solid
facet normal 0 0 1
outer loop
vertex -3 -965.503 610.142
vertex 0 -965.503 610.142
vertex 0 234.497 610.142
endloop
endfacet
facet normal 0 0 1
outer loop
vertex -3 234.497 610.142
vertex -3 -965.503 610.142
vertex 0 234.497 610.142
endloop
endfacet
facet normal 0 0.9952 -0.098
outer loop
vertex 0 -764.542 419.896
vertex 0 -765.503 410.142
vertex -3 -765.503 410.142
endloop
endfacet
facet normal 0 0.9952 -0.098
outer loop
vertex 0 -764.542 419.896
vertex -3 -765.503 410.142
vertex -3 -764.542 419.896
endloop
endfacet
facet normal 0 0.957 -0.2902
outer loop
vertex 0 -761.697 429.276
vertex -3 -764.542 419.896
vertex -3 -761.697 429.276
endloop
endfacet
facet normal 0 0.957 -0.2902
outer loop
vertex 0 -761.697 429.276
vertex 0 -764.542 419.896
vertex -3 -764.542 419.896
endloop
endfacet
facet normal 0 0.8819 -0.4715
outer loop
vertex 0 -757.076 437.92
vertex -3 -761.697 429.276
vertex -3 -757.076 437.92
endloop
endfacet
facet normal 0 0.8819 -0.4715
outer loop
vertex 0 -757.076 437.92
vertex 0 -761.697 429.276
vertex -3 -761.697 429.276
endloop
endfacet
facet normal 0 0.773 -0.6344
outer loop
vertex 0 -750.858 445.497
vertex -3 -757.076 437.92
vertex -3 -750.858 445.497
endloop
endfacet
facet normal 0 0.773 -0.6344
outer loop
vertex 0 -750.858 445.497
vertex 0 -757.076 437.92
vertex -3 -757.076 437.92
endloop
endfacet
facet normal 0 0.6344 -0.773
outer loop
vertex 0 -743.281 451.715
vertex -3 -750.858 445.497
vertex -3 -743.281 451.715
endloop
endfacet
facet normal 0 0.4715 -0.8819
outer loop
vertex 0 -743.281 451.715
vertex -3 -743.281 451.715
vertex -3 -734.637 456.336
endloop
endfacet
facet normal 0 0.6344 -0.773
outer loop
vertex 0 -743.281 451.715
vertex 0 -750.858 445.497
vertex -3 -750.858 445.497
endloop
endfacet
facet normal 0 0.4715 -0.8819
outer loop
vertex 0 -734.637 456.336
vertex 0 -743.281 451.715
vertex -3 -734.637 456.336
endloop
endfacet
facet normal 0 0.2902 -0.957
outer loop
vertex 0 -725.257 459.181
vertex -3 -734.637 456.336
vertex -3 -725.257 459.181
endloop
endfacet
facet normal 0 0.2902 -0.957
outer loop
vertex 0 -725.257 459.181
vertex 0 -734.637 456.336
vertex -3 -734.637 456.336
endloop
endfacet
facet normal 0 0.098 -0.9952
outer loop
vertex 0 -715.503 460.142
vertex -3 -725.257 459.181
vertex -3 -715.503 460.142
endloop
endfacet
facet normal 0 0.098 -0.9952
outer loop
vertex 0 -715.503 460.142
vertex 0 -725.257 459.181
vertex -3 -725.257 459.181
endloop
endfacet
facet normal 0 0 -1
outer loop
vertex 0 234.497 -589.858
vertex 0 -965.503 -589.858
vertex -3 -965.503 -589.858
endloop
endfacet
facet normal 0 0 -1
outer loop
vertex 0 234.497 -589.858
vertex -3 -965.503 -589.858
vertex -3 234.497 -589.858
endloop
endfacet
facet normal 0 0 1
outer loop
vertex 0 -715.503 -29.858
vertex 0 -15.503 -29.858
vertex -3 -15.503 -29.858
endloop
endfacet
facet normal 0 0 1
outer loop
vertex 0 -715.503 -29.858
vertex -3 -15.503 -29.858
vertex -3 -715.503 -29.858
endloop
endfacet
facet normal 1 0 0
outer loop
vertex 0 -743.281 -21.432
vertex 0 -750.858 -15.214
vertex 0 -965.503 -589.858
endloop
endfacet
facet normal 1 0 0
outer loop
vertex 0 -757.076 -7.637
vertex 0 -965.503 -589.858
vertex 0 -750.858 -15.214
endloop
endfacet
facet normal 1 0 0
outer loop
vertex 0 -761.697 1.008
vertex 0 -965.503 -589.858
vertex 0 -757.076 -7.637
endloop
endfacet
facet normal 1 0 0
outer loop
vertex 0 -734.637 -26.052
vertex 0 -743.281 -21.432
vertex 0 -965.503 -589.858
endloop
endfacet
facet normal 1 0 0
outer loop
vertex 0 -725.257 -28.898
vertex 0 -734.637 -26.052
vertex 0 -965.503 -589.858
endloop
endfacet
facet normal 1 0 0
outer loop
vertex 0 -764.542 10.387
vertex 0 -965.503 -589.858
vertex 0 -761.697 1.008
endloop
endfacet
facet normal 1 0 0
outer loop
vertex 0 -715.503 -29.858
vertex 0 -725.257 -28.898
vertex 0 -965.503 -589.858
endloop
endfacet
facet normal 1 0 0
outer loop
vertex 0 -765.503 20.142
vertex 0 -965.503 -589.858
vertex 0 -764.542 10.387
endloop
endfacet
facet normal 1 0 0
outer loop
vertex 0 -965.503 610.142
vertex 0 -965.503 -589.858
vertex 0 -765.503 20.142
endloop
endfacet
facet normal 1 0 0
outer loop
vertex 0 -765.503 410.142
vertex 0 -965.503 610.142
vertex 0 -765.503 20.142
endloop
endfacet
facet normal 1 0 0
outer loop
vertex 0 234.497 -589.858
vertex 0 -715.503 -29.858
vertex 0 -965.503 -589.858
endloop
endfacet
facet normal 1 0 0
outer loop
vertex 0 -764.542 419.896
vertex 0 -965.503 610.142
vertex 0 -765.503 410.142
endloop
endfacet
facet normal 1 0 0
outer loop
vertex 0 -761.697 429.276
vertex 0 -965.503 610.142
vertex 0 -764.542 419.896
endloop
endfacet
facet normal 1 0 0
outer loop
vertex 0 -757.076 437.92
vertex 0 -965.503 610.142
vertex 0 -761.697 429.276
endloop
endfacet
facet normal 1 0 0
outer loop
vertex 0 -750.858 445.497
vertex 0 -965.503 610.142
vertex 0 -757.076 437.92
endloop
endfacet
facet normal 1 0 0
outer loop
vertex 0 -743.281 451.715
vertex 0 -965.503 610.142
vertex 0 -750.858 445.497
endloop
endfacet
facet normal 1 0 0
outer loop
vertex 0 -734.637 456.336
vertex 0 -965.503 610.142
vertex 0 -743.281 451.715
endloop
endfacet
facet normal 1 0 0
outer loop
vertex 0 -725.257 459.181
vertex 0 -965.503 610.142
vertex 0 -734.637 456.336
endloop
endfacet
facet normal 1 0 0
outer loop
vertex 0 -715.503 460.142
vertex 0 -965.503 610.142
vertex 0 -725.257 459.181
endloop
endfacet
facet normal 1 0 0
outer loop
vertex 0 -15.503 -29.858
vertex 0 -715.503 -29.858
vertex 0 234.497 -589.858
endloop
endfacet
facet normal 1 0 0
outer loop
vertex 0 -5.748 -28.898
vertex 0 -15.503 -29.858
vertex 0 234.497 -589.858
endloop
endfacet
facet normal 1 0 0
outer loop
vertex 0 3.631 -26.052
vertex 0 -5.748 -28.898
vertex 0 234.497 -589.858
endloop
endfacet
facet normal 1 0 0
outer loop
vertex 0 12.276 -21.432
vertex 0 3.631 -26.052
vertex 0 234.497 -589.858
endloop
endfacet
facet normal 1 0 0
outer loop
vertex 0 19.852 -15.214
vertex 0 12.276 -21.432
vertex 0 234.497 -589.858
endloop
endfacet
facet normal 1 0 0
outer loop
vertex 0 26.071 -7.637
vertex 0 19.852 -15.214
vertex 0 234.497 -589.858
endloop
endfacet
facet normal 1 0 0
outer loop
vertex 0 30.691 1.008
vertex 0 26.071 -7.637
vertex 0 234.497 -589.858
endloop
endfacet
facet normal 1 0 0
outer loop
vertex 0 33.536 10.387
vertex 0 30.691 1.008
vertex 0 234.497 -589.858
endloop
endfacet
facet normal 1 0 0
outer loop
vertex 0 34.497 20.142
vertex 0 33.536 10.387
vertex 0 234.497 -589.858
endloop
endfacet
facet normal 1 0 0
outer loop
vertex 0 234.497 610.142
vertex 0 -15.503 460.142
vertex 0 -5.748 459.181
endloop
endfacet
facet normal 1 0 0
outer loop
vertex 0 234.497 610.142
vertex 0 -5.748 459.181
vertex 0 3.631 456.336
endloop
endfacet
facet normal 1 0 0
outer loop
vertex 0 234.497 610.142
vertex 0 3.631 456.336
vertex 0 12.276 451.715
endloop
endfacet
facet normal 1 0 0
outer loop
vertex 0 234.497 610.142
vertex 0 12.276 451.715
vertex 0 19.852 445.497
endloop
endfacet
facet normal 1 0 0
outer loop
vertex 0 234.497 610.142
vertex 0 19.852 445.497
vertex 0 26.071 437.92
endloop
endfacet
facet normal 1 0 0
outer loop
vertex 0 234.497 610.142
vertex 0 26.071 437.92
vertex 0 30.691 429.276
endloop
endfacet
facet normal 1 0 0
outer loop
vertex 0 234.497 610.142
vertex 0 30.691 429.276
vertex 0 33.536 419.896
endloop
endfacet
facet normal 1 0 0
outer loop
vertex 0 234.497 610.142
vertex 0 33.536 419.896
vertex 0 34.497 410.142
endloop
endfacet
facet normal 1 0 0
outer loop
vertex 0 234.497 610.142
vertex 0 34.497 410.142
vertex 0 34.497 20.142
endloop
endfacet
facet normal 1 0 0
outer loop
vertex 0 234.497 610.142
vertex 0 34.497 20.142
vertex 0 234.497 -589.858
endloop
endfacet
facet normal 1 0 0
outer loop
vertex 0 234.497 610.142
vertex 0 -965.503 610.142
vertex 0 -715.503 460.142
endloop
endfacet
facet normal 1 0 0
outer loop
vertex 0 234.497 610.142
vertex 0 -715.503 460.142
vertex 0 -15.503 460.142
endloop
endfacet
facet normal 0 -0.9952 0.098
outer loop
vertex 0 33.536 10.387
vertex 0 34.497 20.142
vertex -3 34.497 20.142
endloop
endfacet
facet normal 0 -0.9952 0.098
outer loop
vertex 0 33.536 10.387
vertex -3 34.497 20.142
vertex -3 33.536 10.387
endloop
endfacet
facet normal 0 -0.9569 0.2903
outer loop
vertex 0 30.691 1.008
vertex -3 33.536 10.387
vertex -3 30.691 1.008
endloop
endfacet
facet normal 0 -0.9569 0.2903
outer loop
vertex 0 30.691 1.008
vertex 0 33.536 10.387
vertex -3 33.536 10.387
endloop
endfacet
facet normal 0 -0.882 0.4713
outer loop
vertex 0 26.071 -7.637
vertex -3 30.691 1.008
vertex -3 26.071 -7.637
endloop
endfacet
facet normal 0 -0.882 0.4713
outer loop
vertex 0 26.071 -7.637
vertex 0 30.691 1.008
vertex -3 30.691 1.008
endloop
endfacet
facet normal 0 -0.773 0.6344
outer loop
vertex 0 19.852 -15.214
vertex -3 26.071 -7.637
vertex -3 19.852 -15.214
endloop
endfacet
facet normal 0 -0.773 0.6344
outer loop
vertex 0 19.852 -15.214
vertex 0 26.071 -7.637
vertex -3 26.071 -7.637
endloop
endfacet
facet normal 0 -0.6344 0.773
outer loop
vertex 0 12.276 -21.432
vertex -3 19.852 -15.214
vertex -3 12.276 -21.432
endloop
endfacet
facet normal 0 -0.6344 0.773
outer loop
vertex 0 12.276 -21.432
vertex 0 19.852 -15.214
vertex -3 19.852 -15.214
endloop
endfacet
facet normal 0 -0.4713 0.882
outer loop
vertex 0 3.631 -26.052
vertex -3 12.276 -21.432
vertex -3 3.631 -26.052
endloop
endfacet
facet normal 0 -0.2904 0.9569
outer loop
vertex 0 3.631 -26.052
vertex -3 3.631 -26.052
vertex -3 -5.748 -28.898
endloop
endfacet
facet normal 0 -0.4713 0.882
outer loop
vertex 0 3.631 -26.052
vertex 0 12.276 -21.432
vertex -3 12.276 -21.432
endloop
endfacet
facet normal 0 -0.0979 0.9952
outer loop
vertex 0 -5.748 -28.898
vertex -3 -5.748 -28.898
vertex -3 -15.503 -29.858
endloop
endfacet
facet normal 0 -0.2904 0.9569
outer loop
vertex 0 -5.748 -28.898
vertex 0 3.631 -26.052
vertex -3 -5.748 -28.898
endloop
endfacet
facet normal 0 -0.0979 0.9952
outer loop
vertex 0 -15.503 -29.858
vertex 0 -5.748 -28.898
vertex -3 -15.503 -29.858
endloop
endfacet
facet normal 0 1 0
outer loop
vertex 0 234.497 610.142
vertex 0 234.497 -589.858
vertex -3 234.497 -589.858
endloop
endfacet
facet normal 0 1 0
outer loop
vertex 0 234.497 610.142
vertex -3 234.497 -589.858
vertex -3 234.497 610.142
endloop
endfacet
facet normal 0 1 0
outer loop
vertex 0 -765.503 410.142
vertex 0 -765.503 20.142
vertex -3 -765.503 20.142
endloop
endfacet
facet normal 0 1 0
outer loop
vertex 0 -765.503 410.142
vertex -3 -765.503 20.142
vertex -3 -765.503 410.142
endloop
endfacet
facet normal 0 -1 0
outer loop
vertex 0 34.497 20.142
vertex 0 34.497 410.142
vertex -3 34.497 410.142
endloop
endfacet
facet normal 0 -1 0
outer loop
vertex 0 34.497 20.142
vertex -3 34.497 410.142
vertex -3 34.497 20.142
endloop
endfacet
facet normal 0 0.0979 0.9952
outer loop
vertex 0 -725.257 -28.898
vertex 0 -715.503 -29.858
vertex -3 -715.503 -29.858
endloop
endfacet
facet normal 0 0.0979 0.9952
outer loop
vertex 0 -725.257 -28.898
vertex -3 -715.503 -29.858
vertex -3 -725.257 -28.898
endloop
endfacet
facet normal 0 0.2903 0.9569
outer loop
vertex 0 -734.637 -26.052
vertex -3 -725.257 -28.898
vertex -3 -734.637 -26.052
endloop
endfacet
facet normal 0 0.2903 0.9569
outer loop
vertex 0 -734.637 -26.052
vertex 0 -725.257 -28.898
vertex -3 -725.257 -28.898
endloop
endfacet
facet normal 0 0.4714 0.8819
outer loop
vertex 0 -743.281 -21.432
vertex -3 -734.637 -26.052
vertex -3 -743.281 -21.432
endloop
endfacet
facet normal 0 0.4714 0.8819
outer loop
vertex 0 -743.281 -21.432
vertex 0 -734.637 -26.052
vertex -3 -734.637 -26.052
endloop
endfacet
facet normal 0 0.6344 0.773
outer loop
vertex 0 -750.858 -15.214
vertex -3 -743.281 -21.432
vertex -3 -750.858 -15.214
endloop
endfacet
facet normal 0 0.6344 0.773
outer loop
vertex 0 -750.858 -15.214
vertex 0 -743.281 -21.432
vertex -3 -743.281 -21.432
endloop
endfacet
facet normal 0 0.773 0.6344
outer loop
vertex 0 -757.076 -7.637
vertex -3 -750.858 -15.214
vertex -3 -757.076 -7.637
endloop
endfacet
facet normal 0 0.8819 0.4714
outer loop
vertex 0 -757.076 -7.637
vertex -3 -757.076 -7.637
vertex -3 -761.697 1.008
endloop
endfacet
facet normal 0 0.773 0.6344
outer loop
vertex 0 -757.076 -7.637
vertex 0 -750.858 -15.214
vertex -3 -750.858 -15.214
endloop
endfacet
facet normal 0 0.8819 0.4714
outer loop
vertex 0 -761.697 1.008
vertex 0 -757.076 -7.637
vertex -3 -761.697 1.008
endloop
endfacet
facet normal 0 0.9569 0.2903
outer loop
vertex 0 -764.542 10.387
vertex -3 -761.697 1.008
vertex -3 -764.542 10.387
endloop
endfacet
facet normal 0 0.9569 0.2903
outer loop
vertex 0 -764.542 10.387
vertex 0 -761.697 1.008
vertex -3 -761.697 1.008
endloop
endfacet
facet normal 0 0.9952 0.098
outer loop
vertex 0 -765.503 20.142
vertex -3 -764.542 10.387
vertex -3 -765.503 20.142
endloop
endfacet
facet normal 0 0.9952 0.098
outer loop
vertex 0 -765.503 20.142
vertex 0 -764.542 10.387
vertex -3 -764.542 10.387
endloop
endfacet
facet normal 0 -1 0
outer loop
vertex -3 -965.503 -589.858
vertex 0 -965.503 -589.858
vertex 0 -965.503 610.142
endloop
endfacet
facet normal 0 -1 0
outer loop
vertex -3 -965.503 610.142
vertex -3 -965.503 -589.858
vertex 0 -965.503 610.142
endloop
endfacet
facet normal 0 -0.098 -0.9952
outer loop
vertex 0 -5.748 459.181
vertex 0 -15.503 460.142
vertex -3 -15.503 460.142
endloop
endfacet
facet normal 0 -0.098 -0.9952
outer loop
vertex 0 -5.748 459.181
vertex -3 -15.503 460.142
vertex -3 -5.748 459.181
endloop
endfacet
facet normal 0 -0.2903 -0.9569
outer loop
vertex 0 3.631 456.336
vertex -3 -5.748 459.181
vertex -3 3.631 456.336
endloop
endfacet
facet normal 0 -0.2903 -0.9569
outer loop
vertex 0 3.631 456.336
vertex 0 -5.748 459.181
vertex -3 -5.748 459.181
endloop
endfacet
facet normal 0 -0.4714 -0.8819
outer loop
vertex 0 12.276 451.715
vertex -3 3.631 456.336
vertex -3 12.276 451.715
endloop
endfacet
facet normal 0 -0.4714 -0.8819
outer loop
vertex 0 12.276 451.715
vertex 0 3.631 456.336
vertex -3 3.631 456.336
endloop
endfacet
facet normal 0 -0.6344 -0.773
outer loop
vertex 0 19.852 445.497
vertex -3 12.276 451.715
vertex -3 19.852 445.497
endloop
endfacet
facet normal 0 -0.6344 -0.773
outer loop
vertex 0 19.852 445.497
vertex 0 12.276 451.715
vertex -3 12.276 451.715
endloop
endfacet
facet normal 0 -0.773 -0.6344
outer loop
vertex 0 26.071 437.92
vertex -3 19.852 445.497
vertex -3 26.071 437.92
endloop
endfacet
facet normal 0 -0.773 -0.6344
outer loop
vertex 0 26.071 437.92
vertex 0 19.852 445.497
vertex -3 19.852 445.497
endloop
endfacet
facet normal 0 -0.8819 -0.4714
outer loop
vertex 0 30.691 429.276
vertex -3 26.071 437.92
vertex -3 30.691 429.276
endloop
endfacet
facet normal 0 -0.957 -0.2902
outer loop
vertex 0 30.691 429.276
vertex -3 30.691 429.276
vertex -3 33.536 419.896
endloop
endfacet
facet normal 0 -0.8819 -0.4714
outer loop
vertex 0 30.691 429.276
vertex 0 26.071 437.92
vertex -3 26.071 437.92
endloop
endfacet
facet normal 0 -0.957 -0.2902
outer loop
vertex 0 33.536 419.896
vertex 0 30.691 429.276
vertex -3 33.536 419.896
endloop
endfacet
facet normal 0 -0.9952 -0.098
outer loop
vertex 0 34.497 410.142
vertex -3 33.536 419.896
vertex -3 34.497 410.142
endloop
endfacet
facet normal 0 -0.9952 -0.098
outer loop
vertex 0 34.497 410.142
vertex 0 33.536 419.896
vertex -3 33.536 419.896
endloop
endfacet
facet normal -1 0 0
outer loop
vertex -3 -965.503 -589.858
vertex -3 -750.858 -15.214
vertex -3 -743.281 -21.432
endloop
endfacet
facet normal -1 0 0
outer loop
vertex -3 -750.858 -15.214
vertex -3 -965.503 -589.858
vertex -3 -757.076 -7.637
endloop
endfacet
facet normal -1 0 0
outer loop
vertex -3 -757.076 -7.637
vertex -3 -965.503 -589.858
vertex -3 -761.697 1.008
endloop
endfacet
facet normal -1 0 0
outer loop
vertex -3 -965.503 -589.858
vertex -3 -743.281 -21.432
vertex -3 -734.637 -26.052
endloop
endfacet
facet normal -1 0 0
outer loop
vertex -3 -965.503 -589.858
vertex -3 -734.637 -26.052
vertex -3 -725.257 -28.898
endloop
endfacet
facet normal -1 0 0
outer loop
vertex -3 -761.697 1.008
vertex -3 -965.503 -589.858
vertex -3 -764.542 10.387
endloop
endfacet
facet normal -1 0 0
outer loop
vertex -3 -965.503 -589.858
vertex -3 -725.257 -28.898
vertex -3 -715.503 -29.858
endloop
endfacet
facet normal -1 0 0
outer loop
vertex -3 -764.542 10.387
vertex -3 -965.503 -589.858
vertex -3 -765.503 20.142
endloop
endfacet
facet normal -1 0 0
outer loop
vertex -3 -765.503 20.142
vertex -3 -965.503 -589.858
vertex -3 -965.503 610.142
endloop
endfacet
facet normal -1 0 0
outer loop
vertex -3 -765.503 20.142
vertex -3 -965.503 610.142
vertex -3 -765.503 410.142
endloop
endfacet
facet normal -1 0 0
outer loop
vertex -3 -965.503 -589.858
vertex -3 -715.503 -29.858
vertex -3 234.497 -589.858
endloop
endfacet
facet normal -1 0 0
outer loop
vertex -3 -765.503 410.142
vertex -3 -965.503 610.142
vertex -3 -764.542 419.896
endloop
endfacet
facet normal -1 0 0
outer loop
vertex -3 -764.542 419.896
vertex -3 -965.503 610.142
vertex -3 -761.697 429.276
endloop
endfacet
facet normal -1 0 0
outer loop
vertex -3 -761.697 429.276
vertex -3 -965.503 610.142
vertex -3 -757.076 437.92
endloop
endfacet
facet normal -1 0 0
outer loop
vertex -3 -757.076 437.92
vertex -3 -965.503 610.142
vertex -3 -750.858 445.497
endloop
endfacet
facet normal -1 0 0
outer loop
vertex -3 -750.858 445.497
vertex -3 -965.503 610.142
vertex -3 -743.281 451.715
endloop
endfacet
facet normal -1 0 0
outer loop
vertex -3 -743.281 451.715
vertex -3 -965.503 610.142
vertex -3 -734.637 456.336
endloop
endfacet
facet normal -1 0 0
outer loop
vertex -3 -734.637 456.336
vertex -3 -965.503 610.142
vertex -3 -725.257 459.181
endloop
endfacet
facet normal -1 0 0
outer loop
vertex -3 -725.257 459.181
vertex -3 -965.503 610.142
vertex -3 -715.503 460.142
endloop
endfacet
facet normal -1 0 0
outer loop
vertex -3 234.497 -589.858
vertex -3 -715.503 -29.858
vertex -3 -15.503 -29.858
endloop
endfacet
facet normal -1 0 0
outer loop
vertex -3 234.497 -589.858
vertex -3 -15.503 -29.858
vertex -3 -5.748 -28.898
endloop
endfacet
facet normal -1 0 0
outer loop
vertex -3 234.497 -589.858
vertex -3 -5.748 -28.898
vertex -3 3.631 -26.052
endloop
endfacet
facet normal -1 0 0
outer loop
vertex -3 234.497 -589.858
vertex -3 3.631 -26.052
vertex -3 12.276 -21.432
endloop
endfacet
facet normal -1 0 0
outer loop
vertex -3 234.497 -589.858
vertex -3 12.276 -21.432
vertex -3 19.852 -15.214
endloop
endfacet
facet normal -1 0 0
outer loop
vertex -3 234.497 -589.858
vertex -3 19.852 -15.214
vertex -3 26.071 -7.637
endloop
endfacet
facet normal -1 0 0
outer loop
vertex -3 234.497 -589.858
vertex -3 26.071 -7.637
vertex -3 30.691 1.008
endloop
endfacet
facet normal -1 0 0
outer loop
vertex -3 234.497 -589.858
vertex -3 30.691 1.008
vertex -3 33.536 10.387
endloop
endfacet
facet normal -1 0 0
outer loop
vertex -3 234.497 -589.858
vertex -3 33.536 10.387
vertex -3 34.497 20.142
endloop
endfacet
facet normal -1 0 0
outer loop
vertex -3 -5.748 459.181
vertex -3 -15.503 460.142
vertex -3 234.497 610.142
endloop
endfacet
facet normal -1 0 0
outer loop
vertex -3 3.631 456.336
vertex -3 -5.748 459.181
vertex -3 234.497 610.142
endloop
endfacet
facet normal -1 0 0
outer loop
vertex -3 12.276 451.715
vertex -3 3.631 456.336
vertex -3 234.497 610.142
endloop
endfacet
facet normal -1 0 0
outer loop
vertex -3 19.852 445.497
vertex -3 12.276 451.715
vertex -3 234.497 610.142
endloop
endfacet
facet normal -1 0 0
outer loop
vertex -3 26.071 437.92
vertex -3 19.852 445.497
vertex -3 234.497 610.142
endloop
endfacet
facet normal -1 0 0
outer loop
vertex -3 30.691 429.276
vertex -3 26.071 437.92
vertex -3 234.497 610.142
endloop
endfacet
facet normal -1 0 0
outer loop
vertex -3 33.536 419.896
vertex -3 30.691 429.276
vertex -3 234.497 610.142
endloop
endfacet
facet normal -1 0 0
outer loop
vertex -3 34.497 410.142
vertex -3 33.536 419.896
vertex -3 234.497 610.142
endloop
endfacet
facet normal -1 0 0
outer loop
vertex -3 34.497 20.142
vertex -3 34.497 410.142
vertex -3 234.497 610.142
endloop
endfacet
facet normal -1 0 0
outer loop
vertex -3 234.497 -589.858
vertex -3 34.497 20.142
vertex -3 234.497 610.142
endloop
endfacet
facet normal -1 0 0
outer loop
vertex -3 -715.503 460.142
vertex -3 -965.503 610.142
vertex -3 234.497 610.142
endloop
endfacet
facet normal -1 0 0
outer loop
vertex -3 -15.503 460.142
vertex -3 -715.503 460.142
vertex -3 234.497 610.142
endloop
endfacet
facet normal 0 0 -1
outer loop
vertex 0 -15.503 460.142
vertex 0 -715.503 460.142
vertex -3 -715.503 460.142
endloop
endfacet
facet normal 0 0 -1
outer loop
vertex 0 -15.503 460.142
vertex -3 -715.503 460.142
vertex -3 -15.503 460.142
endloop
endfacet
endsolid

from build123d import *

# Parameters (mm, degrees)
F0_W     = 1200
F0_H     = 1200
F1_DEPTH = 3


with BuildPart() as f1:
    # F0 (on Right) → F1 (new body)
    with BuildSketch(Plane.YZ):
        with Locations((-365.502932, 10.141731)):
            Rectangle(F0_W, F0_H)
        with BuildLine():
            ThreePointArc((-765.502932, 410.141731), (-750.858271, 445.49707), (-715.502932, 460.141731))
            Line((-715.502932, 460.141731), (-15.502932, 460.141731))
            ThreePointArc((-15.502932, 460.141731), (19.852408, 445.49707), (34.497068, 410.141731))
            Line((34.497068, 410.141731), (34.497068, 20.141731))
            ThreePointArc((34.497068, 20.141731), (19.852408, -15.213608), (-15.502932, -29.858269))
            Line((-15.502932, -29.858269), (-715.502932, -29.858269))
            ThreePointArc((-715.502932, -29.858269), (-750.858271, -15.213608), (-765.502932, 20.141731))
            Line((-765.502932, 20.141731), (-765.502932, 410.141731))
        make_face(mode=Mode.SUBTRACT)
    extrude(amount=-F1_DEPTH)


solid = f1.part
